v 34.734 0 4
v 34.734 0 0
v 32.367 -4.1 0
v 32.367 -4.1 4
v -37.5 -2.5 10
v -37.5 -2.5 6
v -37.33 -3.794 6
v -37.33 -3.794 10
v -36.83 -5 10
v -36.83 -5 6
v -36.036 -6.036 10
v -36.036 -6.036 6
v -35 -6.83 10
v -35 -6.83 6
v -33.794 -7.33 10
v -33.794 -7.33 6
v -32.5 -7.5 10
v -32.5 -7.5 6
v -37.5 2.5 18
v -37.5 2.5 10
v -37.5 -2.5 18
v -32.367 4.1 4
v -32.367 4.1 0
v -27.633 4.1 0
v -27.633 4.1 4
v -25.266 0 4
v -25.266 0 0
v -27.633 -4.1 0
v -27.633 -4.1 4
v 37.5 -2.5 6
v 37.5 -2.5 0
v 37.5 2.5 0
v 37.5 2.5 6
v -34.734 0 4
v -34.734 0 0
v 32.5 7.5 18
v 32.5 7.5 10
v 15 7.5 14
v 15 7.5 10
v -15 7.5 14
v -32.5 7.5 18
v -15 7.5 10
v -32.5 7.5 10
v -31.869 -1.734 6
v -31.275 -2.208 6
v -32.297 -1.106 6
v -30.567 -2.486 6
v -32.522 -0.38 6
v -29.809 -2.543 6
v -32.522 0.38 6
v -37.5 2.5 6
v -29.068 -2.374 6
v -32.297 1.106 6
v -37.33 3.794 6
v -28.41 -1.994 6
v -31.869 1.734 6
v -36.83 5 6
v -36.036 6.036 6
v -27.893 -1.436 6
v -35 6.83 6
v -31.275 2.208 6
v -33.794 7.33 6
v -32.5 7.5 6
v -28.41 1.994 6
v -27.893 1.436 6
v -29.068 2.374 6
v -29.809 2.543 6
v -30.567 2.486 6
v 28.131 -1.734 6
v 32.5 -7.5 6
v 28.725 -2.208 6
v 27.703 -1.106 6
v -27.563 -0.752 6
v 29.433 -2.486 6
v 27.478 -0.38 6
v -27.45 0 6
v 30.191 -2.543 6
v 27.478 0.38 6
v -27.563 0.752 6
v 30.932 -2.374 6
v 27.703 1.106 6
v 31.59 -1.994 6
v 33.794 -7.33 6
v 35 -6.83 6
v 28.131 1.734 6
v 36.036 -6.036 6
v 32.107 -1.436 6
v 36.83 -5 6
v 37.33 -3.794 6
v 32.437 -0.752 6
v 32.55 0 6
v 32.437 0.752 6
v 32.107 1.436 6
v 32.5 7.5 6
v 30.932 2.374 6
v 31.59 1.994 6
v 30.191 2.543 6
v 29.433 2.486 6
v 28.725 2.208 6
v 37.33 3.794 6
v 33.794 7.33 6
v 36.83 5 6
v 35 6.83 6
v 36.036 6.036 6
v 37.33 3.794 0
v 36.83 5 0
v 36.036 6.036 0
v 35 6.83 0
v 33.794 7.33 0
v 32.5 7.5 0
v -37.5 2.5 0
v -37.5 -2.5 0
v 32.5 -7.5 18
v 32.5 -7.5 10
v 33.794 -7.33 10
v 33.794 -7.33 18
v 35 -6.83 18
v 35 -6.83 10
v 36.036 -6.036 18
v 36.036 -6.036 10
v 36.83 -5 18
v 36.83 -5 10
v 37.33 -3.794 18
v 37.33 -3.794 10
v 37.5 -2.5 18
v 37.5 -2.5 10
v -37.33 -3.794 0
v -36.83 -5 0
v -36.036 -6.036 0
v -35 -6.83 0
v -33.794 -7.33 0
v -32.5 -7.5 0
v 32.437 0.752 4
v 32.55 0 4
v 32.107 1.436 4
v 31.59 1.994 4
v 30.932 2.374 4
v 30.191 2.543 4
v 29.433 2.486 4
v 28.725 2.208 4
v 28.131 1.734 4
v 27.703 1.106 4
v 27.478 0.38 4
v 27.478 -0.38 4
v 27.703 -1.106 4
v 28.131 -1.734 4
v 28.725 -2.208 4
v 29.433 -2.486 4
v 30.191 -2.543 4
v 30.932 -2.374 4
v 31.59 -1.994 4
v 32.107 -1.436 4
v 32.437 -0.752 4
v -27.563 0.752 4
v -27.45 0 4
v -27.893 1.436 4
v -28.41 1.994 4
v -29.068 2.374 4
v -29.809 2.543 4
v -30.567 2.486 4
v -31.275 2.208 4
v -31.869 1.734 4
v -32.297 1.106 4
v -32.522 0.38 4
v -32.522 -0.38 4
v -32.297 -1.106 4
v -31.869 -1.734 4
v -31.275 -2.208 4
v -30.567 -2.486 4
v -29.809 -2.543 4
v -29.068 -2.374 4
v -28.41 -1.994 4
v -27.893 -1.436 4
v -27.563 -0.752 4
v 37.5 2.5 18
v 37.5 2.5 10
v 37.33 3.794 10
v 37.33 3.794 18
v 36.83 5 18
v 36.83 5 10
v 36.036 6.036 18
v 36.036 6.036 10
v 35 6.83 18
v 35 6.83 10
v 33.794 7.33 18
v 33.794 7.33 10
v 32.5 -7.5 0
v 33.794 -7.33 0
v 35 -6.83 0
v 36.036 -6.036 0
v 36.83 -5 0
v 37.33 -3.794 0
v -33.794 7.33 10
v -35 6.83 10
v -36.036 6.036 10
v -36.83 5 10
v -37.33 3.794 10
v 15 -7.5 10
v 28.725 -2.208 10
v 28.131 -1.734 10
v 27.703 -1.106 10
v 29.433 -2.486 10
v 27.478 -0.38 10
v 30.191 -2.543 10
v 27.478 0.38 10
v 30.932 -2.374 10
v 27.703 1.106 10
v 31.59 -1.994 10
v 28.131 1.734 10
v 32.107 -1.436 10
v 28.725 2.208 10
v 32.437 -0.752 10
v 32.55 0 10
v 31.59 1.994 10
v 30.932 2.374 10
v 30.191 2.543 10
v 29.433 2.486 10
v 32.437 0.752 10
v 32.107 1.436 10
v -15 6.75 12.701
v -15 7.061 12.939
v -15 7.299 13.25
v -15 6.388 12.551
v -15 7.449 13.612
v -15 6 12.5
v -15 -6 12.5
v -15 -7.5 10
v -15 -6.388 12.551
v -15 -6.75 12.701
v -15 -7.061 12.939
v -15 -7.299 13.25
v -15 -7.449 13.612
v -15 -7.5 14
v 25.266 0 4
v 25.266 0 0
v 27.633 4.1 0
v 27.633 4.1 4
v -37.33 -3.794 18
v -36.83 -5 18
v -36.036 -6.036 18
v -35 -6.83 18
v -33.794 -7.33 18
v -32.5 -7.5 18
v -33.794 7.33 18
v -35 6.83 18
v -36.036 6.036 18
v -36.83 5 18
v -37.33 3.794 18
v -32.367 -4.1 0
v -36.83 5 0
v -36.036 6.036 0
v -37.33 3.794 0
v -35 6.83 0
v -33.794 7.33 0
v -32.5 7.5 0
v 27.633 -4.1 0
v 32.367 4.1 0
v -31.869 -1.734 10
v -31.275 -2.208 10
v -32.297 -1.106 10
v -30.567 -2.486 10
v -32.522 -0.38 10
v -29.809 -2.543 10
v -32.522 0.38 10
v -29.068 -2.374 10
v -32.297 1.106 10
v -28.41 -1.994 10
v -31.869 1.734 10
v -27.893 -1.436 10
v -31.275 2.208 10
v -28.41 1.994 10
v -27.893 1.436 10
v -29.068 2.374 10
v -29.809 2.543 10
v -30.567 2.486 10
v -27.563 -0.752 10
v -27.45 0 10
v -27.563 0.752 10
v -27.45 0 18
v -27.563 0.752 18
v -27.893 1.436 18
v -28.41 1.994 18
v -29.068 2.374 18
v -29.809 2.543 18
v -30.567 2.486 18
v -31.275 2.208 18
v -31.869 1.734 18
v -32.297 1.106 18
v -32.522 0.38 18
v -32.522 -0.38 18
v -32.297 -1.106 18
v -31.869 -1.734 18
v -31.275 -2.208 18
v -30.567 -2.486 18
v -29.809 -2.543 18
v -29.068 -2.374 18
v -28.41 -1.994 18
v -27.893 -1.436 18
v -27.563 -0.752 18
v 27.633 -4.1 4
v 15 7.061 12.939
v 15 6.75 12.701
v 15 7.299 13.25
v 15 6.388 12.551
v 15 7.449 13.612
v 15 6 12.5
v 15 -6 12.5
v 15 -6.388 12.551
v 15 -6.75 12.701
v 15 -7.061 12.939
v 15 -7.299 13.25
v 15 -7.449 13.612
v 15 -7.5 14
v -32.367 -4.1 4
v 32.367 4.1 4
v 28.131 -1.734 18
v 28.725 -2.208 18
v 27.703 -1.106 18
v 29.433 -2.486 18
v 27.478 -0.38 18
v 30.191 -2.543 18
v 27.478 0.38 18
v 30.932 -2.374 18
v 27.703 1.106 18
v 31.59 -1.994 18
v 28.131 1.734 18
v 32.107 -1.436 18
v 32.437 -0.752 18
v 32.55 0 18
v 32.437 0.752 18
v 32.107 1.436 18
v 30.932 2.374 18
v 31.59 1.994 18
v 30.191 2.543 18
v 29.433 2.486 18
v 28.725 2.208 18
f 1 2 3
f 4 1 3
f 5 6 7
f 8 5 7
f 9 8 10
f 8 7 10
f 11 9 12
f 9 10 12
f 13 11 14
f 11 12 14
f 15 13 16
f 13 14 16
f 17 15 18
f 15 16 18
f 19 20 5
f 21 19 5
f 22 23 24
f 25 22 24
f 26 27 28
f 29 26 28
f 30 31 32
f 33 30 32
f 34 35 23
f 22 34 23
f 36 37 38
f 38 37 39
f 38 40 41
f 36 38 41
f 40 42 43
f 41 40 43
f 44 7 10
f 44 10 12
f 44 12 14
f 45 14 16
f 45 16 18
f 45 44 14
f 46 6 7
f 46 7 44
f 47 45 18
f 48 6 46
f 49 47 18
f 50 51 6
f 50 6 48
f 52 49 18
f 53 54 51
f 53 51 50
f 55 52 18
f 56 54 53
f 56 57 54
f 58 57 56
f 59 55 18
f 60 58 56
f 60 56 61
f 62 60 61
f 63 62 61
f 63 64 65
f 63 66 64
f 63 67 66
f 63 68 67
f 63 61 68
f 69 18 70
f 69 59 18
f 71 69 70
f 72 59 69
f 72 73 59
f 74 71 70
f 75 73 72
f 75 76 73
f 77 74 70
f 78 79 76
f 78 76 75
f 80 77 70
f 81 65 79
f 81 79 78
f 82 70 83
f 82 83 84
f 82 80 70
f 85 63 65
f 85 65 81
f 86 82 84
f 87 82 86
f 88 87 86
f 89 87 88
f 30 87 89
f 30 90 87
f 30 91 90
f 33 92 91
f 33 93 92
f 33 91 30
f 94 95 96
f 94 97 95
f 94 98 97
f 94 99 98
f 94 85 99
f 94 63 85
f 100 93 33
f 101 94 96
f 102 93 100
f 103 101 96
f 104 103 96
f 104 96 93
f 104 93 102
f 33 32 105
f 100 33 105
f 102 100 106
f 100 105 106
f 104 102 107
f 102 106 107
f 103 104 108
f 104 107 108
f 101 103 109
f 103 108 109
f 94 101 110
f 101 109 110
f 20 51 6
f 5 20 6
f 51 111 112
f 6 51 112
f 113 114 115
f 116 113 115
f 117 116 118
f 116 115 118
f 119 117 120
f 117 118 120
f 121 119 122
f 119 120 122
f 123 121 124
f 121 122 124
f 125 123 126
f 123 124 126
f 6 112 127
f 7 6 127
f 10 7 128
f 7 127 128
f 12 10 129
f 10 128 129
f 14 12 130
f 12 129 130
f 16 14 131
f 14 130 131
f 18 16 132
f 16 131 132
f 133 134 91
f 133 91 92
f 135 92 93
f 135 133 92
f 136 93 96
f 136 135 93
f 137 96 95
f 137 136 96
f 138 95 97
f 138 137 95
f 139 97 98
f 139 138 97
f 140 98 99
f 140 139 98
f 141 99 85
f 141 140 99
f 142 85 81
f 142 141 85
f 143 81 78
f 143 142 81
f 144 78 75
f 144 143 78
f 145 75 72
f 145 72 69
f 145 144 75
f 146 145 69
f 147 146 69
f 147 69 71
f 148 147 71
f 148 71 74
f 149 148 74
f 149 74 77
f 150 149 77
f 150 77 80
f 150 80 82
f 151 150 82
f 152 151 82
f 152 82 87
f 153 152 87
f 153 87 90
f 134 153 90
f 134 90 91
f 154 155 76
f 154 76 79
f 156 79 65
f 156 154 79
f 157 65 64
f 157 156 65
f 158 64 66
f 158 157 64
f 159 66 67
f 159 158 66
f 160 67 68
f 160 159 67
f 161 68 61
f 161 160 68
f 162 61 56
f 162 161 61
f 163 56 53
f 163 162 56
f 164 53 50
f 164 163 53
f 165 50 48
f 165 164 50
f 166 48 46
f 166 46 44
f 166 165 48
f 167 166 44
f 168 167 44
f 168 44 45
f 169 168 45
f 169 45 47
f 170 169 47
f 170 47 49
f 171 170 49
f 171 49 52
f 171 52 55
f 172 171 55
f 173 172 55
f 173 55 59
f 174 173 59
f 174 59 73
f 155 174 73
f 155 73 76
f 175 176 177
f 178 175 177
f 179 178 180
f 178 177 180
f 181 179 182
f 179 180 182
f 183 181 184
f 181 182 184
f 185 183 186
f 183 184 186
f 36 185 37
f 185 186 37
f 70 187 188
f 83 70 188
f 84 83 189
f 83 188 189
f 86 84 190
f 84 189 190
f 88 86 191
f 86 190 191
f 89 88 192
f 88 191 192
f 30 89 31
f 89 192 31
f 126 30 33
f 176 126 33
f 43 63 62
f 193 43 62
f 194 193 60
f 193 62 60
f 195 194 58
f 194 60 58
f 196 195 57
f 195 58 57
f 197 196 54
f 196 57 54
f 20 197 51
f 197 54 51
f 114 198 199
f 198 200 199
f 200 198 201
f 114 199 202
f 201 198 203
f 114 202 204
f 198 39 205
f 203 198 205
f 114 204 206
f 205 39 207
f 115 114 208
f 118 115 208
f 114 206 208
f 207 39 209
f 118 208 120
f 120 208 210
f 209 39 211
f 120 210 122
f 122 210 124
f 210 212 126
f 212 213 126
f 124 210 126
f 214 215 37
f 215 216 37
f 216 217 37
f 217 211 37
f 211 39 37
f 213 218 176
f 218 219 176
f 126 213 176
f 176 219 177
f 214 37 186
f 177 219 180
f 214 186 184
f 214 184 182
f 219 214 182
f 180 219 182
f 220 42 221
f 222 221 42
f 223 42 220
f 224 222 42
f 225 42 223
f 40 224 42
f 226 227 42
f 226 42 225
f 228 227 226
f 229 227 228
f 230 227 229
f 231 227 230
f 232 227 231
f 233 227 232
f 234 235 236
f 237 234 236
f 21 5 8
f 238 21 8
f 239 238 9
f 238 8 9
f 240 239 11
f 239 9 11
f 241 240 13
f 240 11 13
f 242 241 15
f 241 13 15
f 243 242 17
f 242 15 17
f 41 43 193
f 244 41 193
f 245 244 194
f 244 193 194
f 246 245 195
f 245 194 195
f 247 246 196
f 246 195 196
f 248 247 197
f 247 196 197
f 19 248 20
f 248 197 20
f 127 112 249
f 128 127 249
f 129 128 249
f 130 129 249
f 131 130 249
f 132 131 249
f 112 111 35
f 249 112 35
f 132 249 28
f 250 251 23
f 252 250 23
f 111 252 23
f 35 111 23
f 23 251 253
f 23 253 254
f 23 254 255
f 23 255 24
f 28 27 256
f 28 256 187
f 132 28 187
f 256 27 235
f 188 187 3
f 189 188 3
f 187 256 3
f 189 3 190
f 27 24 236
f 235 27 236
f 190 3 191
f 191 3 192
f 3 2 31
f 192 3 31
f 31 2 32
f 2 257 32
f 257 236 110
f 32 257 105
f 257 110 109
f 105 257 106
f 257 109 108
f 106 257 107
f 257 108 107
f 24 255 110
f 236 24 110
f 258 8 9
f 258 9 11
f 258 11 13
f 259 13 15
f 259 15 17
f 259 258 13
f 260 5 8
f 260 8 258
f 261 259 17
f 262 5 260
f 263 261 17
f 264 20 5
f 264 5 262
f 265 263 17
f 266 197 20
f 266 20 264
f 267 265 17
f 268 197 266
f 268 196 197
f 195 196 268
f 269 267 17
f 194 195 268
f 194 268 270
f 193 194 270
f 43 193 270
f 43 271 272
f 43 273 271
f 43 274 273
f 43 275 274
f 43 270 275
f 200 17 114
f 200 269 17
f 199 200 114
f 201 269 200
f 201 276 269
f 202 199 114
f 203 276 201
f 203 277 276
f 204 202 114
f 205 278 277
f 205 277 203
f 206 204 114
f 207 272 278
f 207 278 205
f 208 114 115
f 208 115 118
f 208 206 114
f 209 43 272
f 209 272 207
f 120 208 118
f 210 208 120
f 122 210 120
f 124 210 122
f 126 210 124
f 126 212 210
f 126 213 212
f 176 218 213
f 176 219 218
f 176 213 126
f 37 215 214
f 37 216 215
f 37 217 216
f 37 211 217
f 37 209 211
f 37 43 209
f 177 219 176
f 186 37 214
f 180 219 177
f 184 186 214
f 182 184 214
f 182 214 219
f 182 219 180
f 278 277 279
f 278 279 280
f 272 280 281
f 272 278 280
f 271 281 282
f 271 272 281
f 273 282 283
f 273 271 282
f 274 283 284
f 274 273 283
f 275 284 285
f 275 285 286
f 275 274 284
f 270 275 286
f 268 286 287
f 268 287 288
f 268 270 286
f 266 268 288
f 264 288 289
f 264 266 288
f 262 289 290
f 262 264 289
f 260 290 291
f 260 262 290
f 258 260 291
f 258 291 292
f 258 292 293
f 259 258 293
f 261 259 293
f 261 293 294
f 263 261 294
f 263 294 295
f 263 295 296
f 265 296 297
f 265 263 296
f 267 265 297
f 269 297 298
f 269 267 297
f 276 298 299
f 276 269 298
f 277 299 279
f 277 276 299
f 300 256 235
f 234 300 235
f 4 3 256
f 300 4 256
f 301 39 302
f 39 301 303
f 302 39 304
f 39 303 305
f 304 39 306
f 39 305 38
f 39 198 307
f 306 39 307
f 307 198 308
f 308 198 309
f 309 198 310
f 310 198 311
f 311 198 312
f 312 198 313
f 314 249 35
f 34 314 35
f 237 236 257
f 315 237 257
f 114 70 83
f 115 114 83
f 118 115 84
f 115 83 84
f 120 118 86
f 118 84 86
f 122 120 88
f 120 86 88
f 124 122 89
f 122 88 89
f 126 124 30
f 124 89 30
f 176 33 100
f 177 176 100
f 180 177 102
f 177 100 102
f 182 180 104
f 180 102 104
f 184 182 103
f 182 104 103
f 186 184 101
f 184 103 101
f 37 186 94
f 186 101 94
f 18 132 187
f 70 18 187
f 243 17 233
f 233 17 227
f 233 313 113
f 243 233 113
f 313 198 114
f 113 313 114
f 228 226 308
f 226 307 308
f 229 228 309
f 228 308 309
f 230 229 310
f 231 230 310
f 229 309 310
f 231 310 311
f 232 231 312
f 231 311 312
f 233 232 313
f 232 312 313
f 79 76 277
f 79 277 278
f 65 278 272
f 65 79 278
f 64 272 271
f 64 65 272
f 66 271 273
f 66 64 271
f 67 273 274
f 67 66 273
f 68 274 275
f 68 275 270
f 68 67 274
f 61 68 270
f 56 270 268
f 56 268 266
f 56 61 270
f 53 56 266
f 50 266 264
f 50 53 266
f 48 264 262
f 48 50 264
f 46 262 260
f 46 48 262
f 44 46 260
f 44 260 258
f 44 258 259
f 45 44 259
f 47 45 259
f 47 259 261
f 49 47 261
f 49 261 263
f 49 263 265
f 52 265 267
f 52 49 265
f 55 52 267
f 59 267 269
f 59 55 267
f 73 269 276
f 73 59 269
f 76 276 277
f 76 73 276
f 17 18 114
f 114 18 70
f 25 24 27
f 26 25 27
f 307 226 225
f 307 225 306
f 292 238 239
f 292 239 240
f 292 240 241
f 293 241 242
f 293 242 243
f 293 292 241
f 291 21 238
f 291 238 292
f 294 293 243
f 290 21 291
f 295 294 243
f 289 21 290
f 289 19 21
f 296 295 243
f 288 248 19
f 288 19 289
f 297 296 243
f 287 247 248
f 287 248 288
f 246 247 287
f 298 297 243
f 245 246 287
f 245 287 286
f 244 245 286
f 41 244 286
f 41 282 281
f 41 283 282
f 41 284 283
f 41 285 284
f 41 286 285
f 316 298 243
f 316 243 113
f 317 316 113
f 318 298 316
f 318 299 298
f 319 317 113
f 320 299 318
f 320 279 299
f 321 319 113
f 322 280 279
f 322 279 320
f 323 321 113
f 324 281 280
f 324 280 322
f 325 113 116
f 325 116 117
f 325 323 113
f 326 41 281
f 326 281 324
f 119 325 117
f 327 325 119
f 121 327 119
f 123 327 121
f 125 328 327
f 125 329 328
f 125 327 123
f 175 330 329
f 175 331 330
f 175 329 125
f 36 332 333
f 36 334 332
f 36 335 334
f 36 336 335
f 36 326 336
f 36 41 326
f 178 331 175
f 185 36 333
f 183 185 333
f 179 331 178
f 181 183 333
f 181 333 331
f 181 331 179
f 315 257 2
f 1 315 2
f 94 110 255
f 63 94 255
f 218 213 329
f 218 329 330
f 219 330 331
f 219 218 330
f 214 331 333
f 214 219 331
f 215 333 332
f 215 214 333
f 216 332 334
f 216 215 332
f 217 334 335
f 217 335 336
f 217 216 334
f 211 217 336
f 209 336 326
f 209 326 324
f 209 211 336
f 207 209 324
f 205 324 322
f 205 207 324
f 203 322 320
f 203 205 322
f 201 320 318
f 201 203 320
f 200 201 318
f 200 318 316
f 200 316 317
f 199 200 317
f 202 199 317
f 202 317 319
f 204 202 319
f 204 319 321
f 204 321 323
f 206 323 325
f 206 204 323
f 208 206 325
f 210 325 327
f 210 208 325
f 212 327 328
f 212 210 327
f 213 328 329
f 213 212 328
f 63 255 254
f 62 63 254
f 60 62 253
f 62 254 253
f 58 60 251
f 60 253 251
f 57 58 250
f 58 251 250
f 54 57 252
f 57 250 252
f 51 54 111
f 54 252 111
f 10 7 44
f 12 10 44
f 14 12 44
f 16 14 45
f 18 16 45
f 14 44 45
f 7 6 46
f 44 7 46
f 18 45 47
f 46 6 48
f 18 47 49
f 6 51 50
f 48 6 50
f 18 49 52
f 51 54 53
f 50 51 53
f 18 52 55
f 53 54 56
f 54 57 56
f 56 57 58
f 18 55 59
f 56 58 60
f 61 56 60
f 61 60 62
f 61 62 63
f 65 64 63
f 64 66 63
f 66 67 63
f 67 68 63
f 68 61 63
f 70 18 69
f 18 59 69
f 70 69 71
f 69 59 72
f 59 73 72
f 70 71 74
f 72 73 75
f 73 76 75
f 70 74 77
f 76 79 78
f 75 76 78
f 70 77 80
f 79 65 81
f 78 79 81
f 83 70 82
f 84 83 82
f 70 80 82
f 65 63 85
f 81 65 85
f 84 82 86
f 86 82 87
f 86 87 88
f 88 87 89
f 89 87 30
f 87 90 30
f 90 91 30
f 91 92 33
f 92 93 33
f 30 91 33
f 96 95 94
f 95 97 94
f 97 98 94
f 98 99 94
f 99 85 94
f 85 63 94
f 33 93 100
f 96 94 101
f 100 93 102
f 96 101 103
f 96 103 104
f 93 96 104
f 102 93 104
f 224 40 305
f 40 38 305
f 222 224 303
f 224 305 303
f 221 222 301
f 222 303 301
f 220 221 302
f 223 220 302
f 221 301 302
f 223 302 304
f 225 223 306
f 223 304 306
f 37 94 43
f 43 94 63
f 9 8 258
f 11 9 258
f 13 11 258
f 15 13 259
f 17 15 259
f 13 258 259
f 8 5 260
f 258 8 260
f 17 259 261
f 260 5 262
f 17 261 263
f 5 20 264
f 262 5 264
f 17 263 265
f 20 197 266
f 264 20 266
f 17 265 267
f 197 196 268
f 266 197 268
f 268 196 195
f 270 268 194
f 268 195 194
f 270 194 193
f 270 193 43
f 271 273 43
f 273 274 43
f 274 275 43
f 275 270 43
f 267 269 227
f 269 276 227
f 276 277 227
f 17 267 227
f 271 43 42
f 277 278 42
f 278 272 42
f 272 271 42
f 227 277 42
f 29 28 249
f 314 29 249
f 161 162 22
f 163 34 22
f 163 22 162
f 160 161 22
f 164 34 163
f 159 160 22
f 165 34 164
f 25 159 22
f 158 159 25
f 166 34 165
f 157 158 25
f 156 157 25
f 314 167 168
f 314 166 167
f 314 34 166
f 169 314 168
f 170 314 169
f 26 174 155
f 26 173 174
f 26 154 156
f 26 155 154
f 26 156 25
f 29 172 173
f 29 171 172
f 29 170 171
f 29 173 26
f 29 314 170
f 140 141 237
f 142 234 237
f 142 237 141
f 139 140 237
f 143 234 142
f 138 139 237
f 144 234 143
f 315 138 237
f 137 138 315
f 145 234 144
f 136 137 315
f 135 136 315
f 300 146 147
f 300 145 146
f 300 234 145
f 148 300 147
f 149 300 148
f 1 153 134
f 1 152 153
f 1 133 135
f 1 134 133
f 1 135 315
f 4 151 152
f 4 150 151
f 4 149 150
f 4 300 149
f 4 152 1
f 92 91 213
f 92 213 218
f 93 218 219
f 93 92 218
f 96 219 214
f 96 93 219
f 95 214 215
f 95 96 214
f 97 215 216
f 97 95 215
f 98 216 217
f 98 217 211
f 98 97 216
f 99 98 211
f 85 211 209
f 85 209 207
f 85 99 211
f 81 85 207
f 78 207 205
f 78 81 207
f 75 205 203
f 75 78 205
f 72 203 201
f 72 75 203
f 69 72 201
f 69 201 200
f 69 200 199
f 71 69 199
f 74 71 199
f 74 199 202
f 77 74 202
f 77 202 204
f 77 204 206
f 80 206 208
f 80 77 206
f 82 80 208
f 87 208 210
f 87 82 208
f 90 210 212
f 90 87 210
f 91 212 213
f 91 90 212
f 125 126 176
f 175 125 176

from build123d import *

# Parameters (mm, degrees)
F0_R     = 2.55
F1_DEPTH = 6
F3_DEPTH = 4
F4_R     = 2.55
F5_DEPTH = 4
F6_R     = 2.55
F7_DEPTH = 8
F8_W     = 30
F8_H     = 2.5
F9_DEPTH = 15.001
F10_R    = 1.5


with BuildPart() as f1:
    # F0 (on Top) → F1 (new body)
    with BuildSketch(Plane.XY):
        with BuildLine():
            Line((-32.5, -7.5), (32.5, -7.5))
            ThreePointArc((32.5, -7.5), (36.0355339059, -6.0355339059), (37.5, -2.5))
            Line((37.5, -2.5), (37.5, 2.5))
            ThreePointArc((37.5, 2.5), (36.0355339059, 6.0355339059), (32.5, 7.5))
            Line((32.5, 7.5), (-32.5, 7.5))
            ThreePointArc((-32.5, 7.5), (-36.0355339059, 6.0355339059), (-37.5, 2.5))
            Line((-37.5, 2.5), (-37.5, -2.5))
            ThreePointArc((-37.5, -2.5), (-36.0355339059, -6.0355339059), (-32.5, -7.5))
        make_face()
        with Locations((-30, 0)):
            Circle(F0_R, mode=Mode.SUBTRACT)
        with Locations((30, 0)):
            Circle(F0_R, mode=Mode.SUBTRACT)
    extrude(amount=F1_DEPTH)

    # F2 (on face) → F3 (cut)
    with BuildSketch(Plane(origin=(0, 0, 0), x_dir=(1, 0, 0), z_dir=(0, 0, -1))):
        Polygon((-32.3671361037, -4.1), (-27.6328638963, -4.1), (-25.2657277926, 0), (-27.6328638963, 4.1), (-32.3671361037, 4.1), (-34.7342722074, 0), align=None)
        Polygon((27.6328638963, -4.1), (32.3671361037, -4.1), (34.7342722074, 0), (32.3671361037, 4.1), (27.6328638963, 4.1), (25.2657277926, 0), align=None)
    extrude(amount=-F3_DEPTH, mode=Mode.SUBTRACT)


with BuildPart() as f5:
    # F4 (on face) → F5 (new body)
    with BuildSketch(Plane.XY.offset(6)):
        with BuildLine():
            Line((-32.5, -7.5), (32.5, -7.5))
            ThreePointArc((32.5, -7.5), (36.0355339059, -6.0355339059), (37.5, -2.5))
            Line((37.5, -2.5), (37.5, 2.5))
            ThreePointArc((37.5, 2.5), (36.0355339059, 6.0355339059), (32.5, 7.5))
            Line((32.5, 7.5), (-32.5, 7.5))
            ThreePointArc((-32.5, 7.5), (-36.0355339059, 6.0355339059), (-37.5, 2.5))
            Line((-37.5, 2.5), (-37.5, -2.5))
            ThreePointArc((-37.5, -2.5), (-36.0355339059, -6.0355339059), (-32.5, -7.5))
        make_face()
        with Locations((-30, 0)):
            Circle(F4_R, mode=Mode.SUBTRACT)
        with Locations((30, 0)):
            Circle(F4_R, mode=Mode.SUBTRACT)
    extrude(amount=F5_DEPTH)


with BuildPart() as f7:
    # F6 (on face) → F7 (new body)
    with BuildSketch(Plane.XY.offset(10)):
        with BuildLine():
            ThreePointArc((37.5, 2.5), (36.0355339059, 6.0355339059), (32.5, 7.5))
            Line((32.5, 7.5), (-32.5, 7.5))
            ThreePointArc((-32.5, 7.5), (-36.0355339059, 6.0355339059), (-37.5, 2.5))
            Line((-37.5, 2.5), (-37.5, -2.5))
            ThreePointArc((-37.5, -2.5), (-36.0355339059, -6.0355339059), (-32.5, -7.5))
            Line((-32.5, -7.5), (32.5, -7.5))
            ThreePointArc((32.5, -7.5), (36.0355339059, -6.0355339059), (37.5, -2.5))
            Line((37.5, -2.5), (37.5, 2.5))
        make_face()
        with Locations((-30, 0)):
            Circle(F6_R, mode=Mode.SUBTRACT)
        with Locations((30, 0)):
            Circle(F6_R, mode=Mode.SUBTRACT)
    extrude(amount=F7_DEPTH)

    # F8 (on face) → F9 (cut, through all)
    with BuildSketch(Plane.XZ.offset(7.5)):
        with Locations((0, 11.25)):
            Rectangle(F8_W, F8_H)
    extrude(amount=-F9_DEPTH, mode=Mode.SUBTRACT)

    # F10
    f10_edges = [f7.edges().sort_by_distance(p)[0] for p in [
        (0, 7.5, 12.5),
        (0, -7.5, 12.5),
    ]]
    fillet(f10_edges, radius=F10_R)


solid = Compound([f1.part, f5.part, f7.part])
